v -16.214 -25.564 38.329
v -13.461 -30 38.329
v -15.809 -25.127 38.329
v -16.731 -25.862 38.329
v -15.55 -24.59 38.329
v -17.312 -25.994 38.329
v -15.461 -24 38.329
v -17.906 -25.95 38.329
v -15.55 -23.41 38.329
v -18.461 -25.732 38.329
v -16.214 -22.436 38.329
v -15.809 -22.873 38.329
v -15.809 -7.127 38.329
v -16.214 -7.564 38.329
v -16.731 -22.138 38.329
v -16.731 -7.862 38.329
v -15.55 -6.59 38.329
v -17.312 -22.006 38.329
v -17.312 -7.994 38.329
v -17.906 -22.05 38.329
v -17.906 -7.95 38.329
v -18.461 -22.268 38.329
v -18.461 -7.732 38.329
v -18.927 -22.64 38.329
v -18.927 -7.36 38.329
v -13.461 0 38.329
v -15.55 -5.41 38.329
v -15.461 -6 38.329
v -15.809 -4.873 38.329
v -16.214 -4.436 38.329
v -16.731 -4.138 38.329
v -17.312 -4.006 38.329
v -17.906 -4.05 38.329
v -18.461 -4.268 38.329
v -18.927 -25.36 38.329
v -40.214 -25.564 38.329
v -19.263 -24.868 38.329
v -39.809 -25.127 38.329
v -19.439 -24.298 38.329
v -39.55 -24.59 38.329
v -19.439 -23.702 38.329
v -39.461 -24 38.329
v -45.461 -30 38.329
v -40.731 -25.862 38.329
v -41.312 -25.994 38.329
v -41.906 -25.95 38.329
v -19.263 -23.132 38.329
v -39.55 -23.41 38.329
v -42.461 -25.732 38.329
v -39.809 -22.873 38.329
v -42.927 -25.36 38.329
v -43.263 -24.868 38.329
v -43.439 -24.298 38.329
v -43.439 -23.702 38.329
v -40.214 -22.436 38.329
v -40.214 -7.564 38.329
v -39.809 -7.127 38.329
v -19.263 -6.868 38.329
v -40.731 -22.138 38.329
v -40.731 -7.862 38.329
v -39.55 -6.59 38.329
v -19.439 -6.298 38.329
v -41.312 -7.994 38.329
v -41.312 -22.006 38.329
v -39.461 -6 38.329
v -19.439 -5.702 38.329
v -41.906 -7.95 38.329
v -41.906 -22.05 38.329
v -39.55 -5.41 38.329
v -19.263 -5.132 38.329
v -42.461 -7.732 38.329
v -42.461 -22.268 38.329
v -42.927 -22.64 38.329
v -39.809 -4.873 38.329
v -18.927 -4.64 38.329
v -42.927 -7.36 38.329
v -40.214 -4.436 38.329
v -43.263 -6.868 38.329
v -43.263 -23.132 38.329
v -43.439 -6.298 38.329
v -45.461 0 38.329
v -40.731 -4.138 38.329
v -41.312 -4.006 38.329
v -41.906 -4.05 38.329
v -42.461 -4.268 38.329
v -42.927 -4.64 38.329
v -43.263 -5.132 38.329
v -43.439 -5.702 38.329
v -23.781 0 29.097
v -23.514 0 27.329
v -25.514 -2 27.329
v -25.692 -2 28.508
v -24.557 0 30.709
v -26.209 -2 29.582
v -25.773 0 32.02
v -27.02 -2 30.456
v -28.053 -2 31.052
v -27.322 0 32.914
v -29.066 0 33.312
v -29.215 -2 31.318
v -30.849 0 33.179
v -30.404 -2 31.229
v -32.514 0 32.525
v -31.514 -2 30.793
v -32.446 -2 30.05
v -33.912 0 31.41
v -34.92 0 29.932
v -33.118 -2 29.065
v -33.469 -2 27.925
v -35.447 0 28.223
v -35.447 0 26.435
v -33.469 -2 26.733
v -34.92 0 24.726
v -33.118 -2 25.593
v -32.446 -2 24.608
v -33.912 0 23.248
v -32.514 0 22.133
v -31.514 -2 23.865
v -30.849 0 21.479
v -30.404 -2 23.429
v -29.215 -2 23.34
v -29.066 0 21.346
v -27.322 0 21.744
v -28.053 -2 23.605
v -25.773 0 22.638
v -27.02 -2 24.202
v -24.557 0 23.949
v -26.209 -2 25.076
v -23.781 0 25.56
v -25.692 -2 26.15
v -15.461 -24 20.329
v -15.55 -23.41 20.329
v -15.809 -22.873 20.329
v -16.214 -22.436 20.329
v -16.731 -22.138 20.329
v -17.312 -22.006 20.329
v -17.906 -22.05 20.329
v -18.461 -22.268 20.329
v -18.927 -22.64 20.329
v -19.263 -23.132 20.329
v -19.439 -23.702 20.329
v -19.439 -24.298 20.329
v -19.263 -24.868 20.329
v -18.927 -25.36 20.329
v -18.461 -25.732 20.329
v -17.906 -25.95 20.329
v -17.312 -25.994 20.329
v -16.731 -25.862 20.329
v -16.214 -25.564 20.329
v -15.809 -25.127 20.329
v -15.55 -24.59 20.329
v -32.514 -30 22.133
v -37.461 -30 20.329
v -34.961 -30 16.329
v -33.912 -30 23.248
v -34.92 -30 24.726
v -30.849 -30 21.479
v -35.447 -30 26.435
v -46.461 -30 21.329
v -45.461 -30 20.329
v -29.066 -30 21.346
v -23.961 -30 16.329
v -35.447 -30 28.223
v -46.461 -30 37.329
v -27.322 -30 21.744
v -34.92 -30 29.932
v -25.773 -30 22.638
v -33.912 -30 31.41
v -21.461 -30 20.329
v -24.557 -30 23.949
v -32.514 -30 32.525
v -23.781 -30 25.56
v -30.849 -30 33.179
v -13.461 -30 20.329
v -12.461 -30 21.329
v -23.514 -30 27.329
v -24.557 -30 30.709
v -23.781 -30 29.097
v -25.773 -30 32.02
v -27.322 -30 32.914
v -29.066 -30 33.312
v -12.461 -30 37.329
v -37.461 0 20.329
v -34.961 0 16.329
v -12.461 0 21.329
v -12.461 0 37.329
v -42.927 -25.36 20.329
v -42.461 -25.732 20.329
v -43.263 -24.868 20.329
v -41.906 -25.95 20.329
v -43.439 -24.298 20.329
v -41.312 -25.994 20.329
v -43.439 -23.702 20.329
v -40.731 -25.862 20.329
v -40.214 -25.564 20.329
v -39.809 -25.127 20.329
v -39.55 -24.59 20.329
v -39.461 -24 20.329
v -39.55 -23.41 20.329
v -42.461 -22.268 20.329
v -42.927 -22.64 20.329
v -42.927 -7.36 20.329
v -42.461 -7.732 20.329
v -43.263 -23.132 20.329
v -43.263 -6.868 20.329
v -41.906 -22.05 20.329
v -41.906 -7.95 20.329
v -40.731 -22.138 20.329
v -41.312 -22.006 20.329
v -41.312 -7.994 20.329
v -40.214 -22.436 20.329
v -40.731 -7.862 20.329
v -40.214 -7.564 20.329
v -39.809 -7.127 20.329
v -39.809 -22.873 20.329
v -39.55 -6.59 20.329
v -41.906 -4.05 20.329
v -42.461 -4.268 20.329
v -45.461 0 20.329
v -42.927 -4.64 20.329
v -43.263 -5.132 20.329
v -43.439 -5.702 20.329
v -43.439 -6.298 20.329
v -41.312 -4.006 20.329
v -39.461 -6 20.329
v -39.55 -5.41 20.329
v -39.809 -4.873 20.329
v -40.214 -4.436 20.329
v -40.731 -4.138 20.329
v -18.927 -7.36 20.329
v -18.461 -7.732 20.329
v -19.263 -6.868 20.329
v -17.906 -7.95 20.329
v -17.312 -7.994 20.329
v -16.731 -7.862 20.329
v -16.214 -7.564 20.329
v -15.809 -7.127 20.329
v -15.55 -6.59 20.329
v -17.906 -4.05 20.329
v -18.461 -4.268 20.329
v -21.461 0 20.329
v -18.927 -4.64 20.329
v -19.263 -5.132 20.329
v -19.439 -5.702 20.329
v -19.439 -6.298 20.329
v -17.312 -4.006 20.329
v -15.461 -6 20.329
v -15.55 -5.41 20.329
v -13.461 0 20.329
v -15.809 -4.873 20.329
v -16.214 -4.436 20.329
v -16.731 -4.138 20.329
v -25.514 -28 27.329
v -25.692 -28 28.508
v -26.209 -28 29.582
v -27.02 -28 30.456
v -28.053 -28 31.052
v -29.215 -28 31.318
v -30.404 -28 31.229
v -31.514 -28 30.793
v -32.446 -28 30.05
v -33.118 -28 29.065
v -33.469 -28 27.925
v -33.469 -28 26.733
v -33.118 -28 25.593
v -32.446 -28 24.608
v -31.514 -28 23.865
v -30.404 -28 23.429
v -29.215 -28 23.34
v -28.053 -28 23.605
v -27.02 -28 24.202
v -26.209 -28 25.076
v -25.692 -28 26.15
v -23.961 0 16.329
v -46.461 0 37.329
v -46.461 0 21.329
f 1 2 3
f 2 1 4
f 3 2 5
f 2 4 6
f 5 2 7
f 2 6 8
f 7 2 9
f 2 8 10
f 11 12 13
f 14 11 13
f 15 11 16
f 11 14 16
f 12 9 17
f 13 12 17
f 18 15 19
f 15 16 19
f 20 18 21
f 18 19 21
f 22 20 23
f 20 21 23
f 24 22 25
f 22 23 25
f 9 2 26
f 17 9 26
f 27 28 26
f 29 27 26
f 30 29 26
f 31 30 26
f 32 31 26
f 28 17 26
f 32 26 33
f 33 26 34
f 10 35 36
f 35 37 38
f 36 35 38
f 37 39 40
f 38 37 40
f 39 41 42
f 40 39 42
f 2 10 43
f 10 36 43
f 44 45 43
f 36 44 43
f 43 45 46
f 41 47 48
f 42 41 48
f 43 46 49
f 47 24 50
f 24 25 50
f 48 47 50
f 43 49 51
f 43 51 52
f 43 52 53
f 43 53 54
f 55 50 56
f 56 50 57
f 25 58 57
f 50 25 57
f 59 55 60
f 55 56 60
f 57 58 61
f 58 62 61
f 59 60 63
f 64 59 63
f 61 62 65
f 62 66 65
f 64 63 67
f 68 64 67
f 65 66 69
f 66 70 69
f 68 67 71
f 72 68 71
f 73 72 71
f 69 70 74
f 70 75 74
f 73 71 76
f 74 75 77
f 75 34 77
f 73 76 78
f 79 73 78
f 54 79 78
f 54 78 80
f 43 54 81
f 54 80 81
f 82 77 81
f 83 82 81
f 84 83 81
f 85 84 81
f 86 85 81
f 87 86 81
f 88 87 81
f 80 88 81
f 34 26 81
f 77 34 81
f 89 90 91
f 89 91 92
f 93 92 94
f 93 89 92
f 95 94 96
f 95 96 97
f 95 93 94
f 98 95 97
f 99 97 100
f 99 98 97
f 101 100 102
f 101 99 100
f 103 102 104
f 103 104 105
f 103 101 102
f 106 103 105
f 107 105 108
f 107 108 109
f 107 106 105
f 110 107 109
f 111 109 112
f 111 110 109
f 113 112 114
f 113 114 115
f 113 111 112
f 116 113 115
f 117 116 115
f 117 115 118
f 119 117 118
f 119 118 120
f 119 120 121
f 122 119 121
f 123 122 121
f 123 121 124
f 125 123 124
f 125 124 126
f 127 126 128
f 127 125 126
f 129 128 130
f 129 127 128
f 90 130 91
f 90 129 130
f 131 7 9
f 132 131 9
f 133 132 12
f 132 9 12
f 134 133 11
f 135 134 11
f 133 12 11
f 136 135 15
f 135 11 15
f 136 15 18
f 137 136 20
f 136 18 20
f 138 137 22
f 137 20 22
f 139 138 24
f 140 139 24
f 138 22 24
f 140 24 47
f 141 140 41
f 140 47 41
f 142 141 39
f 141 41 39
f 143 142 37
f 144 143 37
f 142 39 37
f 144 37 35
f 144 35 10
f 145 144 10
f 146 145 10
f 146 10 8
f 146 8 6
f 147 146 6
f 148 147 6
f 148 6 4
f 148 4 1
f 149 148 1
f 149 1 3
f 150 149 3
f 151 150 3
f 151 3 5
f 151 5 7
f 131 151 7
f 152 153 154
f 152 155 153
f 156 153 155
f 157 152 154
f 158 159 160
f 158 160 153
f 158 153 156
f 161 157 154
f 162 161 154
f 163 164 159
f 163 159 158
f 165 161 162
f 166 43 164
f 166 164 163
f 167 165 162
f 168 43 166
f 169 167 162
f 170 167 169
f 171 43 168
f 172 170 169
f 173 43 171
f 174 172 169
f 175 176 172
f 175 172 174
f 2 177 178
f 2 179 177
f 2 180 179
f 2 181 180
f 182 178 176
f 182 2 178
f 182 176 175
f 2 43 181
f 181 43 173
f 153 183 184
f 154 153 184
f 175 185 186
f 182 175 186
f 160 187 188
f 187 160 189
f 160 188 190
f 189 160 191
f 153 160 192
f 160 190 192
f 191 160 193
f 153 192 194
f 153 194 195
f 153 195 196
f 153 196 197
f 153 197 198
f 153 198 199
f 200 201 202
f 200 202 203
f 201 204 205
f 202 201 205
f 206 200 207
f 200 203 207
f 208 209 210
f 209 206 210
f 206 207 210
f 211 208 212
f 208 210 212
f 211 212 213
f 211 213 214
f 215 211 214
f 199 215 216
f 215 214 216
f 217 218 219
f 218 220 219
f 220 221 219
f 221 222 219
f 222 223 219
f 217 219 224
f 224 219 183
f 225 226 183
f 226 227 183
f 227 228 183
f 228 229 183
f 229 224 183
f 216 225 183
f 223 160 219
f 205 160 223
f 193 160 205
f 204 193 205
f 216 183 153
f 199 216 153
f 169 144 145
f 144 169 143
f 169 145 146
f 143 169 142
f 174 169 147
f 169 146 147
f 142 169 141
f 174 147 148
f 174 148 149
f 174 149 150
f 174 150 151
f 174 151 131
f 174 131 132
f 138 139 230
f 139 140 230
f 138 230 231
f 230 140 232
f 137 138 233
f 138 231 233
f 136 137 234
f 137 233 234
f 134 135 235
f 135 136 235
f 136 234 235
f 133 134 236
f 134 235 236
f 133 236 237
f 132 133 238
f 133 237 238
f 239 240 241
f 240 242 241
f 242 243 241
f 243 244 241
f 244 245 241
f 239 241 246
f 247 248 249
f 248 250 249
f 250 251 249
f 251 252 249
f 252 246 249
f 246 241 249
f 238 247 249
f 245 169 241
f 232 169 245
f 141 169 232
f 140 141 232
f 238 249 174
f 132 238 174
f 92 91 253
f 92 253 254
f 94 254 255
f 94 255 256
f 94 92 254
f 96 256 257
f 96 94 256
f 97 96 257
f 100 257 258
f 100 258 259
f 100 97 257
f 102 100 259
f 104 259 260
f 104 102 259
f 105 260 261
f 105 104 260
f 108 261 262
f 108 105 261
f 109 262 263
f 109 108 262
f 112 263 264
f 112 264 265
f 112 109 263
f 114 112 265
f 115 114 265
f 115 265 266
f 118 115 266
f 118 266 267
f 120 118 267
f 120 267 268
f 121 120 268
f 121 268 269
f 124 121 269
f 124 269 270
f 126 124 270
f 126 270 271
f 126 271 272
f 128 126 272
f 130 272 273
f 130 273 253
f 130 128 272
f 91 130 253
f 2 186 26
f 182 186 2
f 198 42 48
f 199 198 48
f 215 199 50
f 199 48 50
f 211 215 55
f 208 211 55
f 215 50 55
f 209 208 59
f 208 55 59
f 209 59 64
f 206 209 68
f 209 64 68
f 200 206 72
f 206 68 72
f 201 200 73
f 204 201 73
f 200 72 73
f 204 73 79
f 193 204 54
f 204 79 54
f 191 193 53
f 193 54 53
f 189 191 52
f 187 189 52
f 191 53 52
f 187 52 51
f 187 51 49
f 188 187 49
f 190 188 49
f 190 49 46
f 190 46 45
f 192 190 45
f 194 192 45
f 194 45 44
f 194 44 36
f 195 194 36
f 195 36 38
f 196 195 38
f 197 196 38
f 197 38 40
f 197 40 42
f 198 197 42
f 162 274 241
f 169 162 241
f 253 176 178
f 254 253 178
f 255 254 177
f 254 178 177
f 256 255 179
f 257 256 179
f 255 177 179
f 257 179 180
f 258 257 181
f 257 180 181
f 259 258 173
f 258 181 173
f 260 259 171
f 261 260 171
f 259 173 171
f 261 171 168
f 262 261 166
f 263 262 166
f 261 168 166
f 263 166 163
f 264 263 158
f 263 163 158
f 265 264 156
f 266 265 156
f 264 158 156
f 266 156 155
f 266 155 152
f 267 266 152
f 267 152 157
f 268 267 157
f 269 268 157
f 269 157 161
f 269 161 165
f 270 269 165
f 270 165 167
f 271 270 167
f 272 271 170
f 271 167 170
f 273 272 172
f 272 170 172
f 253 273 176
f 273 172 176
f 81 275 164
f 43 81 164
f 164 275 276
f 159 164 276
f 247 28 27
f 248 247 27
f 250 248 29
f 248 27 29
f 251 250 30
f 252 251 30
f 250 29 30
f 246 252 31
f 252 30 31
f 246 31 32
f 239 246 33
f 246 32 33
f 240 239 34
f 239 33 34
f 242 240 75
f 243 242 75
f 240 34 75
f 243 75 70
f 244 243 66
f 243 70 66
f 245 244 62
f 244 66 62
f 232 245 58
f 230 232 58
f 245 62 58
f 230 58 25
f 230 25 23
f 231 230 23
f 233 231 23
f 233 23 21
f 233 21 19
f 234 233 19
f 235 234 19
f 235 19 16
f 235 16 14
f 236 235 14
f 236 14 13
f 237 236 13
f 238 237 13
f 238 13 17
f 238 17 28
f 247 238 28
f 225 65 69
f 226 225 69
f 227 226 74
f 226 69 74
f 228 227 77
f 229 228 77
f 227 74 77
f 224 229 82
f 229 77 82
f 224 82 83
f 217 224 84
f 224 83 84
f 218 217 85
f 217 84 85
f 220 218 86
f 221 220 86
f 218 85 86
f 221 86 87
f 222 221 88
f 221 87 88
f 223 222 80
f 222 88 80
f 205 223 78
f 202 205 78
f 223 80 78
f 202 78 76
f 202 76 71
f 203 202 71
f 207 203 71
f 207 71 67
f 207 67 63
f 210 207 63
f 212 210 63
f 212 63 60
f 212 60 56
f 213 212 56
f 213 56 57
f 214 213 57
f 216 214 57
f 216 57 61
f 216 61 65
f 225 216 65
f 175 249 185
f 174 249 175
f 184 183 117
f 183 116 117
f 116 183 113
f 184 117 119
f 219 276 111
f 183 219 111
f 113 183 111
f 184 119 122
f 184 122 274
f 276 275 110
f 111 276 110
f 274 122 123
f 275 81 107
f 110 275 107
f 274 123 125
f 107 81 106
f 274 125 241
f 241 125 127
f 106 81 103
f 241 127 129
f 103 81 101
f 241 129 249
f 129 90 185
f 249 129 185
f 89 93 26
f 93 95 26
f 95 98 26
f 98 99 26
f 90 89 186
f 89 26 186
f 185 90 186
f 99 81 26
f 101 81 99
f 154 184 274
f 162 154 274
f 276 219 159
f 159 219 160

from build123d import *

# Parameters (mm, degrees)
F0_R     = 4
F1_DEPTH = 30
F2_SIZE  = 2
F3_SIZE  = 1
F4_R     = 2
F5_DEPTH = 25


with BuildPart() as f1:
    # F0 (on Front) → F1 (new body)
    with BuildSketch(Plane.XZ):
        Polygon((-12.461195, 38.328968), (-46.461195, 38.328968), (-46.461195, 20.328968), (-37.461195, 20.328968), (-34.961195, 16.328968), (-23.961195, 16.328968), (-21.461195, 20.328968), (-12.461195, 20.328968), align=None)
        with Locations((-29.514153, 27.328968)):
            Circle(F0_R, mode=Mode.SUBTRACT)
    extrude(amount=F1_DEPTH)

    # F2
    f2_edges = [f1.edges().sort_by_distance(p)[0] for p in [
        (-33.514153, -30, 27.328968),
        (-33.514153, 0, 27.328968),
    ]]
    chamfer(f2_edges, length=F2_SIZE)

    # F3
    f3_edges = [f1.edges().sort_by_distance(p)[0] for p in [
        (-46.461195, -15, 38.328968),
        (-12.461195, -15, 38.328968),
        (-12.461195, -15, 20.328968),
        (-46.461195, -15, 20.328968),
    ]]
    chamfer(f3_edges, length=F3_SIZE)

    # F4 (on face) → F5 (cut)
    with BuildSketch(Plane.XY.offset(38.328968)):
        with Locations((-41.461195, -6)):
            Circle(F4_R)
        with Locations((-41.461195, -24)):
            Circle(F4_R)
        with Locations((-17.461195, -24)):
            Circle(F4_R)
        with Locations((-17.461195, -6)):
            Circle(F4_R)
    extrude(amount=-F5_DEPTH, mode=Mode.SUBTRACT)


solid = f1.part
